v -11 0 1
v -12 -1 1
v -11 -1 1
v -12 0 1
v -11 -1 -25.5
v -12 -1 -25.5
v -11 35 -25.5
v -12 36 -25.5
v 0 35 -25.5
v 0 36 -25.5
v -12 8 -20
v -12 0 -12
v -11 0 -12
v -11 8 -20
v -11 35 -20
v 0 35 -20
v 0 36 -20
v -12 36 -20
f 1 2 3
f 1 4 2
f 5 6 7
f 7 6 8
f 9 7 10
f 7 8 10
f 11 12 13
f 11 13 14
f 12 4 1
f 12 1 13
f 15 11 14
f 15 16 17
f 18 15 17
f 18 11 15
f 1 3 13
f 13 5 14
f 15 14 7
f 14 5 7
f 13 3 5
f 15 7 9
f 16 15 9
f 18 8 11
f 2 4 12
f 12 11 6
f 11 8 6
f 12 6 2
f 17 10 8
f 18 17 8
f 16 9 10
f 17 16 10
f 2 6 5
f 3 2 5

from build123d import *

# Parameters (mm, degrees)
EXTRUDE039_DEPTH = 15
EXTRUDE038_DEPTH = 26.5


with BuildPart() as extrude039:
    # Sketch046 → Extrude039 (new body)
    with BuildSketch(Plane(origin=(-14, 0, 0), x_dir=(0, -1, 0), z_dir=(-1, 0, 0))):
        Polygon((0, 4), (0, -12), (-8, -20), (-41, -20), (-41, 4), align=None)
    extrude(amount=-EXTRUDE039_DEPTH)


with BuildPart() as cut009:
    # Sketch045 → Extrude038 (new body)
    with BuildSketch(Plane.XY.offset(-25.5)):
        Polygon((-11, -1), (-11, 35), (0, 35), (0, 36), (-12, 36), (-12, -1), align=None)
    extrude(amount=EXTRUDE038_DEPTH)

    # Cut009: cut Extrude039
    add(extrude039.part, mode=Mode.SUBTRACT)


solid = cut009.part
